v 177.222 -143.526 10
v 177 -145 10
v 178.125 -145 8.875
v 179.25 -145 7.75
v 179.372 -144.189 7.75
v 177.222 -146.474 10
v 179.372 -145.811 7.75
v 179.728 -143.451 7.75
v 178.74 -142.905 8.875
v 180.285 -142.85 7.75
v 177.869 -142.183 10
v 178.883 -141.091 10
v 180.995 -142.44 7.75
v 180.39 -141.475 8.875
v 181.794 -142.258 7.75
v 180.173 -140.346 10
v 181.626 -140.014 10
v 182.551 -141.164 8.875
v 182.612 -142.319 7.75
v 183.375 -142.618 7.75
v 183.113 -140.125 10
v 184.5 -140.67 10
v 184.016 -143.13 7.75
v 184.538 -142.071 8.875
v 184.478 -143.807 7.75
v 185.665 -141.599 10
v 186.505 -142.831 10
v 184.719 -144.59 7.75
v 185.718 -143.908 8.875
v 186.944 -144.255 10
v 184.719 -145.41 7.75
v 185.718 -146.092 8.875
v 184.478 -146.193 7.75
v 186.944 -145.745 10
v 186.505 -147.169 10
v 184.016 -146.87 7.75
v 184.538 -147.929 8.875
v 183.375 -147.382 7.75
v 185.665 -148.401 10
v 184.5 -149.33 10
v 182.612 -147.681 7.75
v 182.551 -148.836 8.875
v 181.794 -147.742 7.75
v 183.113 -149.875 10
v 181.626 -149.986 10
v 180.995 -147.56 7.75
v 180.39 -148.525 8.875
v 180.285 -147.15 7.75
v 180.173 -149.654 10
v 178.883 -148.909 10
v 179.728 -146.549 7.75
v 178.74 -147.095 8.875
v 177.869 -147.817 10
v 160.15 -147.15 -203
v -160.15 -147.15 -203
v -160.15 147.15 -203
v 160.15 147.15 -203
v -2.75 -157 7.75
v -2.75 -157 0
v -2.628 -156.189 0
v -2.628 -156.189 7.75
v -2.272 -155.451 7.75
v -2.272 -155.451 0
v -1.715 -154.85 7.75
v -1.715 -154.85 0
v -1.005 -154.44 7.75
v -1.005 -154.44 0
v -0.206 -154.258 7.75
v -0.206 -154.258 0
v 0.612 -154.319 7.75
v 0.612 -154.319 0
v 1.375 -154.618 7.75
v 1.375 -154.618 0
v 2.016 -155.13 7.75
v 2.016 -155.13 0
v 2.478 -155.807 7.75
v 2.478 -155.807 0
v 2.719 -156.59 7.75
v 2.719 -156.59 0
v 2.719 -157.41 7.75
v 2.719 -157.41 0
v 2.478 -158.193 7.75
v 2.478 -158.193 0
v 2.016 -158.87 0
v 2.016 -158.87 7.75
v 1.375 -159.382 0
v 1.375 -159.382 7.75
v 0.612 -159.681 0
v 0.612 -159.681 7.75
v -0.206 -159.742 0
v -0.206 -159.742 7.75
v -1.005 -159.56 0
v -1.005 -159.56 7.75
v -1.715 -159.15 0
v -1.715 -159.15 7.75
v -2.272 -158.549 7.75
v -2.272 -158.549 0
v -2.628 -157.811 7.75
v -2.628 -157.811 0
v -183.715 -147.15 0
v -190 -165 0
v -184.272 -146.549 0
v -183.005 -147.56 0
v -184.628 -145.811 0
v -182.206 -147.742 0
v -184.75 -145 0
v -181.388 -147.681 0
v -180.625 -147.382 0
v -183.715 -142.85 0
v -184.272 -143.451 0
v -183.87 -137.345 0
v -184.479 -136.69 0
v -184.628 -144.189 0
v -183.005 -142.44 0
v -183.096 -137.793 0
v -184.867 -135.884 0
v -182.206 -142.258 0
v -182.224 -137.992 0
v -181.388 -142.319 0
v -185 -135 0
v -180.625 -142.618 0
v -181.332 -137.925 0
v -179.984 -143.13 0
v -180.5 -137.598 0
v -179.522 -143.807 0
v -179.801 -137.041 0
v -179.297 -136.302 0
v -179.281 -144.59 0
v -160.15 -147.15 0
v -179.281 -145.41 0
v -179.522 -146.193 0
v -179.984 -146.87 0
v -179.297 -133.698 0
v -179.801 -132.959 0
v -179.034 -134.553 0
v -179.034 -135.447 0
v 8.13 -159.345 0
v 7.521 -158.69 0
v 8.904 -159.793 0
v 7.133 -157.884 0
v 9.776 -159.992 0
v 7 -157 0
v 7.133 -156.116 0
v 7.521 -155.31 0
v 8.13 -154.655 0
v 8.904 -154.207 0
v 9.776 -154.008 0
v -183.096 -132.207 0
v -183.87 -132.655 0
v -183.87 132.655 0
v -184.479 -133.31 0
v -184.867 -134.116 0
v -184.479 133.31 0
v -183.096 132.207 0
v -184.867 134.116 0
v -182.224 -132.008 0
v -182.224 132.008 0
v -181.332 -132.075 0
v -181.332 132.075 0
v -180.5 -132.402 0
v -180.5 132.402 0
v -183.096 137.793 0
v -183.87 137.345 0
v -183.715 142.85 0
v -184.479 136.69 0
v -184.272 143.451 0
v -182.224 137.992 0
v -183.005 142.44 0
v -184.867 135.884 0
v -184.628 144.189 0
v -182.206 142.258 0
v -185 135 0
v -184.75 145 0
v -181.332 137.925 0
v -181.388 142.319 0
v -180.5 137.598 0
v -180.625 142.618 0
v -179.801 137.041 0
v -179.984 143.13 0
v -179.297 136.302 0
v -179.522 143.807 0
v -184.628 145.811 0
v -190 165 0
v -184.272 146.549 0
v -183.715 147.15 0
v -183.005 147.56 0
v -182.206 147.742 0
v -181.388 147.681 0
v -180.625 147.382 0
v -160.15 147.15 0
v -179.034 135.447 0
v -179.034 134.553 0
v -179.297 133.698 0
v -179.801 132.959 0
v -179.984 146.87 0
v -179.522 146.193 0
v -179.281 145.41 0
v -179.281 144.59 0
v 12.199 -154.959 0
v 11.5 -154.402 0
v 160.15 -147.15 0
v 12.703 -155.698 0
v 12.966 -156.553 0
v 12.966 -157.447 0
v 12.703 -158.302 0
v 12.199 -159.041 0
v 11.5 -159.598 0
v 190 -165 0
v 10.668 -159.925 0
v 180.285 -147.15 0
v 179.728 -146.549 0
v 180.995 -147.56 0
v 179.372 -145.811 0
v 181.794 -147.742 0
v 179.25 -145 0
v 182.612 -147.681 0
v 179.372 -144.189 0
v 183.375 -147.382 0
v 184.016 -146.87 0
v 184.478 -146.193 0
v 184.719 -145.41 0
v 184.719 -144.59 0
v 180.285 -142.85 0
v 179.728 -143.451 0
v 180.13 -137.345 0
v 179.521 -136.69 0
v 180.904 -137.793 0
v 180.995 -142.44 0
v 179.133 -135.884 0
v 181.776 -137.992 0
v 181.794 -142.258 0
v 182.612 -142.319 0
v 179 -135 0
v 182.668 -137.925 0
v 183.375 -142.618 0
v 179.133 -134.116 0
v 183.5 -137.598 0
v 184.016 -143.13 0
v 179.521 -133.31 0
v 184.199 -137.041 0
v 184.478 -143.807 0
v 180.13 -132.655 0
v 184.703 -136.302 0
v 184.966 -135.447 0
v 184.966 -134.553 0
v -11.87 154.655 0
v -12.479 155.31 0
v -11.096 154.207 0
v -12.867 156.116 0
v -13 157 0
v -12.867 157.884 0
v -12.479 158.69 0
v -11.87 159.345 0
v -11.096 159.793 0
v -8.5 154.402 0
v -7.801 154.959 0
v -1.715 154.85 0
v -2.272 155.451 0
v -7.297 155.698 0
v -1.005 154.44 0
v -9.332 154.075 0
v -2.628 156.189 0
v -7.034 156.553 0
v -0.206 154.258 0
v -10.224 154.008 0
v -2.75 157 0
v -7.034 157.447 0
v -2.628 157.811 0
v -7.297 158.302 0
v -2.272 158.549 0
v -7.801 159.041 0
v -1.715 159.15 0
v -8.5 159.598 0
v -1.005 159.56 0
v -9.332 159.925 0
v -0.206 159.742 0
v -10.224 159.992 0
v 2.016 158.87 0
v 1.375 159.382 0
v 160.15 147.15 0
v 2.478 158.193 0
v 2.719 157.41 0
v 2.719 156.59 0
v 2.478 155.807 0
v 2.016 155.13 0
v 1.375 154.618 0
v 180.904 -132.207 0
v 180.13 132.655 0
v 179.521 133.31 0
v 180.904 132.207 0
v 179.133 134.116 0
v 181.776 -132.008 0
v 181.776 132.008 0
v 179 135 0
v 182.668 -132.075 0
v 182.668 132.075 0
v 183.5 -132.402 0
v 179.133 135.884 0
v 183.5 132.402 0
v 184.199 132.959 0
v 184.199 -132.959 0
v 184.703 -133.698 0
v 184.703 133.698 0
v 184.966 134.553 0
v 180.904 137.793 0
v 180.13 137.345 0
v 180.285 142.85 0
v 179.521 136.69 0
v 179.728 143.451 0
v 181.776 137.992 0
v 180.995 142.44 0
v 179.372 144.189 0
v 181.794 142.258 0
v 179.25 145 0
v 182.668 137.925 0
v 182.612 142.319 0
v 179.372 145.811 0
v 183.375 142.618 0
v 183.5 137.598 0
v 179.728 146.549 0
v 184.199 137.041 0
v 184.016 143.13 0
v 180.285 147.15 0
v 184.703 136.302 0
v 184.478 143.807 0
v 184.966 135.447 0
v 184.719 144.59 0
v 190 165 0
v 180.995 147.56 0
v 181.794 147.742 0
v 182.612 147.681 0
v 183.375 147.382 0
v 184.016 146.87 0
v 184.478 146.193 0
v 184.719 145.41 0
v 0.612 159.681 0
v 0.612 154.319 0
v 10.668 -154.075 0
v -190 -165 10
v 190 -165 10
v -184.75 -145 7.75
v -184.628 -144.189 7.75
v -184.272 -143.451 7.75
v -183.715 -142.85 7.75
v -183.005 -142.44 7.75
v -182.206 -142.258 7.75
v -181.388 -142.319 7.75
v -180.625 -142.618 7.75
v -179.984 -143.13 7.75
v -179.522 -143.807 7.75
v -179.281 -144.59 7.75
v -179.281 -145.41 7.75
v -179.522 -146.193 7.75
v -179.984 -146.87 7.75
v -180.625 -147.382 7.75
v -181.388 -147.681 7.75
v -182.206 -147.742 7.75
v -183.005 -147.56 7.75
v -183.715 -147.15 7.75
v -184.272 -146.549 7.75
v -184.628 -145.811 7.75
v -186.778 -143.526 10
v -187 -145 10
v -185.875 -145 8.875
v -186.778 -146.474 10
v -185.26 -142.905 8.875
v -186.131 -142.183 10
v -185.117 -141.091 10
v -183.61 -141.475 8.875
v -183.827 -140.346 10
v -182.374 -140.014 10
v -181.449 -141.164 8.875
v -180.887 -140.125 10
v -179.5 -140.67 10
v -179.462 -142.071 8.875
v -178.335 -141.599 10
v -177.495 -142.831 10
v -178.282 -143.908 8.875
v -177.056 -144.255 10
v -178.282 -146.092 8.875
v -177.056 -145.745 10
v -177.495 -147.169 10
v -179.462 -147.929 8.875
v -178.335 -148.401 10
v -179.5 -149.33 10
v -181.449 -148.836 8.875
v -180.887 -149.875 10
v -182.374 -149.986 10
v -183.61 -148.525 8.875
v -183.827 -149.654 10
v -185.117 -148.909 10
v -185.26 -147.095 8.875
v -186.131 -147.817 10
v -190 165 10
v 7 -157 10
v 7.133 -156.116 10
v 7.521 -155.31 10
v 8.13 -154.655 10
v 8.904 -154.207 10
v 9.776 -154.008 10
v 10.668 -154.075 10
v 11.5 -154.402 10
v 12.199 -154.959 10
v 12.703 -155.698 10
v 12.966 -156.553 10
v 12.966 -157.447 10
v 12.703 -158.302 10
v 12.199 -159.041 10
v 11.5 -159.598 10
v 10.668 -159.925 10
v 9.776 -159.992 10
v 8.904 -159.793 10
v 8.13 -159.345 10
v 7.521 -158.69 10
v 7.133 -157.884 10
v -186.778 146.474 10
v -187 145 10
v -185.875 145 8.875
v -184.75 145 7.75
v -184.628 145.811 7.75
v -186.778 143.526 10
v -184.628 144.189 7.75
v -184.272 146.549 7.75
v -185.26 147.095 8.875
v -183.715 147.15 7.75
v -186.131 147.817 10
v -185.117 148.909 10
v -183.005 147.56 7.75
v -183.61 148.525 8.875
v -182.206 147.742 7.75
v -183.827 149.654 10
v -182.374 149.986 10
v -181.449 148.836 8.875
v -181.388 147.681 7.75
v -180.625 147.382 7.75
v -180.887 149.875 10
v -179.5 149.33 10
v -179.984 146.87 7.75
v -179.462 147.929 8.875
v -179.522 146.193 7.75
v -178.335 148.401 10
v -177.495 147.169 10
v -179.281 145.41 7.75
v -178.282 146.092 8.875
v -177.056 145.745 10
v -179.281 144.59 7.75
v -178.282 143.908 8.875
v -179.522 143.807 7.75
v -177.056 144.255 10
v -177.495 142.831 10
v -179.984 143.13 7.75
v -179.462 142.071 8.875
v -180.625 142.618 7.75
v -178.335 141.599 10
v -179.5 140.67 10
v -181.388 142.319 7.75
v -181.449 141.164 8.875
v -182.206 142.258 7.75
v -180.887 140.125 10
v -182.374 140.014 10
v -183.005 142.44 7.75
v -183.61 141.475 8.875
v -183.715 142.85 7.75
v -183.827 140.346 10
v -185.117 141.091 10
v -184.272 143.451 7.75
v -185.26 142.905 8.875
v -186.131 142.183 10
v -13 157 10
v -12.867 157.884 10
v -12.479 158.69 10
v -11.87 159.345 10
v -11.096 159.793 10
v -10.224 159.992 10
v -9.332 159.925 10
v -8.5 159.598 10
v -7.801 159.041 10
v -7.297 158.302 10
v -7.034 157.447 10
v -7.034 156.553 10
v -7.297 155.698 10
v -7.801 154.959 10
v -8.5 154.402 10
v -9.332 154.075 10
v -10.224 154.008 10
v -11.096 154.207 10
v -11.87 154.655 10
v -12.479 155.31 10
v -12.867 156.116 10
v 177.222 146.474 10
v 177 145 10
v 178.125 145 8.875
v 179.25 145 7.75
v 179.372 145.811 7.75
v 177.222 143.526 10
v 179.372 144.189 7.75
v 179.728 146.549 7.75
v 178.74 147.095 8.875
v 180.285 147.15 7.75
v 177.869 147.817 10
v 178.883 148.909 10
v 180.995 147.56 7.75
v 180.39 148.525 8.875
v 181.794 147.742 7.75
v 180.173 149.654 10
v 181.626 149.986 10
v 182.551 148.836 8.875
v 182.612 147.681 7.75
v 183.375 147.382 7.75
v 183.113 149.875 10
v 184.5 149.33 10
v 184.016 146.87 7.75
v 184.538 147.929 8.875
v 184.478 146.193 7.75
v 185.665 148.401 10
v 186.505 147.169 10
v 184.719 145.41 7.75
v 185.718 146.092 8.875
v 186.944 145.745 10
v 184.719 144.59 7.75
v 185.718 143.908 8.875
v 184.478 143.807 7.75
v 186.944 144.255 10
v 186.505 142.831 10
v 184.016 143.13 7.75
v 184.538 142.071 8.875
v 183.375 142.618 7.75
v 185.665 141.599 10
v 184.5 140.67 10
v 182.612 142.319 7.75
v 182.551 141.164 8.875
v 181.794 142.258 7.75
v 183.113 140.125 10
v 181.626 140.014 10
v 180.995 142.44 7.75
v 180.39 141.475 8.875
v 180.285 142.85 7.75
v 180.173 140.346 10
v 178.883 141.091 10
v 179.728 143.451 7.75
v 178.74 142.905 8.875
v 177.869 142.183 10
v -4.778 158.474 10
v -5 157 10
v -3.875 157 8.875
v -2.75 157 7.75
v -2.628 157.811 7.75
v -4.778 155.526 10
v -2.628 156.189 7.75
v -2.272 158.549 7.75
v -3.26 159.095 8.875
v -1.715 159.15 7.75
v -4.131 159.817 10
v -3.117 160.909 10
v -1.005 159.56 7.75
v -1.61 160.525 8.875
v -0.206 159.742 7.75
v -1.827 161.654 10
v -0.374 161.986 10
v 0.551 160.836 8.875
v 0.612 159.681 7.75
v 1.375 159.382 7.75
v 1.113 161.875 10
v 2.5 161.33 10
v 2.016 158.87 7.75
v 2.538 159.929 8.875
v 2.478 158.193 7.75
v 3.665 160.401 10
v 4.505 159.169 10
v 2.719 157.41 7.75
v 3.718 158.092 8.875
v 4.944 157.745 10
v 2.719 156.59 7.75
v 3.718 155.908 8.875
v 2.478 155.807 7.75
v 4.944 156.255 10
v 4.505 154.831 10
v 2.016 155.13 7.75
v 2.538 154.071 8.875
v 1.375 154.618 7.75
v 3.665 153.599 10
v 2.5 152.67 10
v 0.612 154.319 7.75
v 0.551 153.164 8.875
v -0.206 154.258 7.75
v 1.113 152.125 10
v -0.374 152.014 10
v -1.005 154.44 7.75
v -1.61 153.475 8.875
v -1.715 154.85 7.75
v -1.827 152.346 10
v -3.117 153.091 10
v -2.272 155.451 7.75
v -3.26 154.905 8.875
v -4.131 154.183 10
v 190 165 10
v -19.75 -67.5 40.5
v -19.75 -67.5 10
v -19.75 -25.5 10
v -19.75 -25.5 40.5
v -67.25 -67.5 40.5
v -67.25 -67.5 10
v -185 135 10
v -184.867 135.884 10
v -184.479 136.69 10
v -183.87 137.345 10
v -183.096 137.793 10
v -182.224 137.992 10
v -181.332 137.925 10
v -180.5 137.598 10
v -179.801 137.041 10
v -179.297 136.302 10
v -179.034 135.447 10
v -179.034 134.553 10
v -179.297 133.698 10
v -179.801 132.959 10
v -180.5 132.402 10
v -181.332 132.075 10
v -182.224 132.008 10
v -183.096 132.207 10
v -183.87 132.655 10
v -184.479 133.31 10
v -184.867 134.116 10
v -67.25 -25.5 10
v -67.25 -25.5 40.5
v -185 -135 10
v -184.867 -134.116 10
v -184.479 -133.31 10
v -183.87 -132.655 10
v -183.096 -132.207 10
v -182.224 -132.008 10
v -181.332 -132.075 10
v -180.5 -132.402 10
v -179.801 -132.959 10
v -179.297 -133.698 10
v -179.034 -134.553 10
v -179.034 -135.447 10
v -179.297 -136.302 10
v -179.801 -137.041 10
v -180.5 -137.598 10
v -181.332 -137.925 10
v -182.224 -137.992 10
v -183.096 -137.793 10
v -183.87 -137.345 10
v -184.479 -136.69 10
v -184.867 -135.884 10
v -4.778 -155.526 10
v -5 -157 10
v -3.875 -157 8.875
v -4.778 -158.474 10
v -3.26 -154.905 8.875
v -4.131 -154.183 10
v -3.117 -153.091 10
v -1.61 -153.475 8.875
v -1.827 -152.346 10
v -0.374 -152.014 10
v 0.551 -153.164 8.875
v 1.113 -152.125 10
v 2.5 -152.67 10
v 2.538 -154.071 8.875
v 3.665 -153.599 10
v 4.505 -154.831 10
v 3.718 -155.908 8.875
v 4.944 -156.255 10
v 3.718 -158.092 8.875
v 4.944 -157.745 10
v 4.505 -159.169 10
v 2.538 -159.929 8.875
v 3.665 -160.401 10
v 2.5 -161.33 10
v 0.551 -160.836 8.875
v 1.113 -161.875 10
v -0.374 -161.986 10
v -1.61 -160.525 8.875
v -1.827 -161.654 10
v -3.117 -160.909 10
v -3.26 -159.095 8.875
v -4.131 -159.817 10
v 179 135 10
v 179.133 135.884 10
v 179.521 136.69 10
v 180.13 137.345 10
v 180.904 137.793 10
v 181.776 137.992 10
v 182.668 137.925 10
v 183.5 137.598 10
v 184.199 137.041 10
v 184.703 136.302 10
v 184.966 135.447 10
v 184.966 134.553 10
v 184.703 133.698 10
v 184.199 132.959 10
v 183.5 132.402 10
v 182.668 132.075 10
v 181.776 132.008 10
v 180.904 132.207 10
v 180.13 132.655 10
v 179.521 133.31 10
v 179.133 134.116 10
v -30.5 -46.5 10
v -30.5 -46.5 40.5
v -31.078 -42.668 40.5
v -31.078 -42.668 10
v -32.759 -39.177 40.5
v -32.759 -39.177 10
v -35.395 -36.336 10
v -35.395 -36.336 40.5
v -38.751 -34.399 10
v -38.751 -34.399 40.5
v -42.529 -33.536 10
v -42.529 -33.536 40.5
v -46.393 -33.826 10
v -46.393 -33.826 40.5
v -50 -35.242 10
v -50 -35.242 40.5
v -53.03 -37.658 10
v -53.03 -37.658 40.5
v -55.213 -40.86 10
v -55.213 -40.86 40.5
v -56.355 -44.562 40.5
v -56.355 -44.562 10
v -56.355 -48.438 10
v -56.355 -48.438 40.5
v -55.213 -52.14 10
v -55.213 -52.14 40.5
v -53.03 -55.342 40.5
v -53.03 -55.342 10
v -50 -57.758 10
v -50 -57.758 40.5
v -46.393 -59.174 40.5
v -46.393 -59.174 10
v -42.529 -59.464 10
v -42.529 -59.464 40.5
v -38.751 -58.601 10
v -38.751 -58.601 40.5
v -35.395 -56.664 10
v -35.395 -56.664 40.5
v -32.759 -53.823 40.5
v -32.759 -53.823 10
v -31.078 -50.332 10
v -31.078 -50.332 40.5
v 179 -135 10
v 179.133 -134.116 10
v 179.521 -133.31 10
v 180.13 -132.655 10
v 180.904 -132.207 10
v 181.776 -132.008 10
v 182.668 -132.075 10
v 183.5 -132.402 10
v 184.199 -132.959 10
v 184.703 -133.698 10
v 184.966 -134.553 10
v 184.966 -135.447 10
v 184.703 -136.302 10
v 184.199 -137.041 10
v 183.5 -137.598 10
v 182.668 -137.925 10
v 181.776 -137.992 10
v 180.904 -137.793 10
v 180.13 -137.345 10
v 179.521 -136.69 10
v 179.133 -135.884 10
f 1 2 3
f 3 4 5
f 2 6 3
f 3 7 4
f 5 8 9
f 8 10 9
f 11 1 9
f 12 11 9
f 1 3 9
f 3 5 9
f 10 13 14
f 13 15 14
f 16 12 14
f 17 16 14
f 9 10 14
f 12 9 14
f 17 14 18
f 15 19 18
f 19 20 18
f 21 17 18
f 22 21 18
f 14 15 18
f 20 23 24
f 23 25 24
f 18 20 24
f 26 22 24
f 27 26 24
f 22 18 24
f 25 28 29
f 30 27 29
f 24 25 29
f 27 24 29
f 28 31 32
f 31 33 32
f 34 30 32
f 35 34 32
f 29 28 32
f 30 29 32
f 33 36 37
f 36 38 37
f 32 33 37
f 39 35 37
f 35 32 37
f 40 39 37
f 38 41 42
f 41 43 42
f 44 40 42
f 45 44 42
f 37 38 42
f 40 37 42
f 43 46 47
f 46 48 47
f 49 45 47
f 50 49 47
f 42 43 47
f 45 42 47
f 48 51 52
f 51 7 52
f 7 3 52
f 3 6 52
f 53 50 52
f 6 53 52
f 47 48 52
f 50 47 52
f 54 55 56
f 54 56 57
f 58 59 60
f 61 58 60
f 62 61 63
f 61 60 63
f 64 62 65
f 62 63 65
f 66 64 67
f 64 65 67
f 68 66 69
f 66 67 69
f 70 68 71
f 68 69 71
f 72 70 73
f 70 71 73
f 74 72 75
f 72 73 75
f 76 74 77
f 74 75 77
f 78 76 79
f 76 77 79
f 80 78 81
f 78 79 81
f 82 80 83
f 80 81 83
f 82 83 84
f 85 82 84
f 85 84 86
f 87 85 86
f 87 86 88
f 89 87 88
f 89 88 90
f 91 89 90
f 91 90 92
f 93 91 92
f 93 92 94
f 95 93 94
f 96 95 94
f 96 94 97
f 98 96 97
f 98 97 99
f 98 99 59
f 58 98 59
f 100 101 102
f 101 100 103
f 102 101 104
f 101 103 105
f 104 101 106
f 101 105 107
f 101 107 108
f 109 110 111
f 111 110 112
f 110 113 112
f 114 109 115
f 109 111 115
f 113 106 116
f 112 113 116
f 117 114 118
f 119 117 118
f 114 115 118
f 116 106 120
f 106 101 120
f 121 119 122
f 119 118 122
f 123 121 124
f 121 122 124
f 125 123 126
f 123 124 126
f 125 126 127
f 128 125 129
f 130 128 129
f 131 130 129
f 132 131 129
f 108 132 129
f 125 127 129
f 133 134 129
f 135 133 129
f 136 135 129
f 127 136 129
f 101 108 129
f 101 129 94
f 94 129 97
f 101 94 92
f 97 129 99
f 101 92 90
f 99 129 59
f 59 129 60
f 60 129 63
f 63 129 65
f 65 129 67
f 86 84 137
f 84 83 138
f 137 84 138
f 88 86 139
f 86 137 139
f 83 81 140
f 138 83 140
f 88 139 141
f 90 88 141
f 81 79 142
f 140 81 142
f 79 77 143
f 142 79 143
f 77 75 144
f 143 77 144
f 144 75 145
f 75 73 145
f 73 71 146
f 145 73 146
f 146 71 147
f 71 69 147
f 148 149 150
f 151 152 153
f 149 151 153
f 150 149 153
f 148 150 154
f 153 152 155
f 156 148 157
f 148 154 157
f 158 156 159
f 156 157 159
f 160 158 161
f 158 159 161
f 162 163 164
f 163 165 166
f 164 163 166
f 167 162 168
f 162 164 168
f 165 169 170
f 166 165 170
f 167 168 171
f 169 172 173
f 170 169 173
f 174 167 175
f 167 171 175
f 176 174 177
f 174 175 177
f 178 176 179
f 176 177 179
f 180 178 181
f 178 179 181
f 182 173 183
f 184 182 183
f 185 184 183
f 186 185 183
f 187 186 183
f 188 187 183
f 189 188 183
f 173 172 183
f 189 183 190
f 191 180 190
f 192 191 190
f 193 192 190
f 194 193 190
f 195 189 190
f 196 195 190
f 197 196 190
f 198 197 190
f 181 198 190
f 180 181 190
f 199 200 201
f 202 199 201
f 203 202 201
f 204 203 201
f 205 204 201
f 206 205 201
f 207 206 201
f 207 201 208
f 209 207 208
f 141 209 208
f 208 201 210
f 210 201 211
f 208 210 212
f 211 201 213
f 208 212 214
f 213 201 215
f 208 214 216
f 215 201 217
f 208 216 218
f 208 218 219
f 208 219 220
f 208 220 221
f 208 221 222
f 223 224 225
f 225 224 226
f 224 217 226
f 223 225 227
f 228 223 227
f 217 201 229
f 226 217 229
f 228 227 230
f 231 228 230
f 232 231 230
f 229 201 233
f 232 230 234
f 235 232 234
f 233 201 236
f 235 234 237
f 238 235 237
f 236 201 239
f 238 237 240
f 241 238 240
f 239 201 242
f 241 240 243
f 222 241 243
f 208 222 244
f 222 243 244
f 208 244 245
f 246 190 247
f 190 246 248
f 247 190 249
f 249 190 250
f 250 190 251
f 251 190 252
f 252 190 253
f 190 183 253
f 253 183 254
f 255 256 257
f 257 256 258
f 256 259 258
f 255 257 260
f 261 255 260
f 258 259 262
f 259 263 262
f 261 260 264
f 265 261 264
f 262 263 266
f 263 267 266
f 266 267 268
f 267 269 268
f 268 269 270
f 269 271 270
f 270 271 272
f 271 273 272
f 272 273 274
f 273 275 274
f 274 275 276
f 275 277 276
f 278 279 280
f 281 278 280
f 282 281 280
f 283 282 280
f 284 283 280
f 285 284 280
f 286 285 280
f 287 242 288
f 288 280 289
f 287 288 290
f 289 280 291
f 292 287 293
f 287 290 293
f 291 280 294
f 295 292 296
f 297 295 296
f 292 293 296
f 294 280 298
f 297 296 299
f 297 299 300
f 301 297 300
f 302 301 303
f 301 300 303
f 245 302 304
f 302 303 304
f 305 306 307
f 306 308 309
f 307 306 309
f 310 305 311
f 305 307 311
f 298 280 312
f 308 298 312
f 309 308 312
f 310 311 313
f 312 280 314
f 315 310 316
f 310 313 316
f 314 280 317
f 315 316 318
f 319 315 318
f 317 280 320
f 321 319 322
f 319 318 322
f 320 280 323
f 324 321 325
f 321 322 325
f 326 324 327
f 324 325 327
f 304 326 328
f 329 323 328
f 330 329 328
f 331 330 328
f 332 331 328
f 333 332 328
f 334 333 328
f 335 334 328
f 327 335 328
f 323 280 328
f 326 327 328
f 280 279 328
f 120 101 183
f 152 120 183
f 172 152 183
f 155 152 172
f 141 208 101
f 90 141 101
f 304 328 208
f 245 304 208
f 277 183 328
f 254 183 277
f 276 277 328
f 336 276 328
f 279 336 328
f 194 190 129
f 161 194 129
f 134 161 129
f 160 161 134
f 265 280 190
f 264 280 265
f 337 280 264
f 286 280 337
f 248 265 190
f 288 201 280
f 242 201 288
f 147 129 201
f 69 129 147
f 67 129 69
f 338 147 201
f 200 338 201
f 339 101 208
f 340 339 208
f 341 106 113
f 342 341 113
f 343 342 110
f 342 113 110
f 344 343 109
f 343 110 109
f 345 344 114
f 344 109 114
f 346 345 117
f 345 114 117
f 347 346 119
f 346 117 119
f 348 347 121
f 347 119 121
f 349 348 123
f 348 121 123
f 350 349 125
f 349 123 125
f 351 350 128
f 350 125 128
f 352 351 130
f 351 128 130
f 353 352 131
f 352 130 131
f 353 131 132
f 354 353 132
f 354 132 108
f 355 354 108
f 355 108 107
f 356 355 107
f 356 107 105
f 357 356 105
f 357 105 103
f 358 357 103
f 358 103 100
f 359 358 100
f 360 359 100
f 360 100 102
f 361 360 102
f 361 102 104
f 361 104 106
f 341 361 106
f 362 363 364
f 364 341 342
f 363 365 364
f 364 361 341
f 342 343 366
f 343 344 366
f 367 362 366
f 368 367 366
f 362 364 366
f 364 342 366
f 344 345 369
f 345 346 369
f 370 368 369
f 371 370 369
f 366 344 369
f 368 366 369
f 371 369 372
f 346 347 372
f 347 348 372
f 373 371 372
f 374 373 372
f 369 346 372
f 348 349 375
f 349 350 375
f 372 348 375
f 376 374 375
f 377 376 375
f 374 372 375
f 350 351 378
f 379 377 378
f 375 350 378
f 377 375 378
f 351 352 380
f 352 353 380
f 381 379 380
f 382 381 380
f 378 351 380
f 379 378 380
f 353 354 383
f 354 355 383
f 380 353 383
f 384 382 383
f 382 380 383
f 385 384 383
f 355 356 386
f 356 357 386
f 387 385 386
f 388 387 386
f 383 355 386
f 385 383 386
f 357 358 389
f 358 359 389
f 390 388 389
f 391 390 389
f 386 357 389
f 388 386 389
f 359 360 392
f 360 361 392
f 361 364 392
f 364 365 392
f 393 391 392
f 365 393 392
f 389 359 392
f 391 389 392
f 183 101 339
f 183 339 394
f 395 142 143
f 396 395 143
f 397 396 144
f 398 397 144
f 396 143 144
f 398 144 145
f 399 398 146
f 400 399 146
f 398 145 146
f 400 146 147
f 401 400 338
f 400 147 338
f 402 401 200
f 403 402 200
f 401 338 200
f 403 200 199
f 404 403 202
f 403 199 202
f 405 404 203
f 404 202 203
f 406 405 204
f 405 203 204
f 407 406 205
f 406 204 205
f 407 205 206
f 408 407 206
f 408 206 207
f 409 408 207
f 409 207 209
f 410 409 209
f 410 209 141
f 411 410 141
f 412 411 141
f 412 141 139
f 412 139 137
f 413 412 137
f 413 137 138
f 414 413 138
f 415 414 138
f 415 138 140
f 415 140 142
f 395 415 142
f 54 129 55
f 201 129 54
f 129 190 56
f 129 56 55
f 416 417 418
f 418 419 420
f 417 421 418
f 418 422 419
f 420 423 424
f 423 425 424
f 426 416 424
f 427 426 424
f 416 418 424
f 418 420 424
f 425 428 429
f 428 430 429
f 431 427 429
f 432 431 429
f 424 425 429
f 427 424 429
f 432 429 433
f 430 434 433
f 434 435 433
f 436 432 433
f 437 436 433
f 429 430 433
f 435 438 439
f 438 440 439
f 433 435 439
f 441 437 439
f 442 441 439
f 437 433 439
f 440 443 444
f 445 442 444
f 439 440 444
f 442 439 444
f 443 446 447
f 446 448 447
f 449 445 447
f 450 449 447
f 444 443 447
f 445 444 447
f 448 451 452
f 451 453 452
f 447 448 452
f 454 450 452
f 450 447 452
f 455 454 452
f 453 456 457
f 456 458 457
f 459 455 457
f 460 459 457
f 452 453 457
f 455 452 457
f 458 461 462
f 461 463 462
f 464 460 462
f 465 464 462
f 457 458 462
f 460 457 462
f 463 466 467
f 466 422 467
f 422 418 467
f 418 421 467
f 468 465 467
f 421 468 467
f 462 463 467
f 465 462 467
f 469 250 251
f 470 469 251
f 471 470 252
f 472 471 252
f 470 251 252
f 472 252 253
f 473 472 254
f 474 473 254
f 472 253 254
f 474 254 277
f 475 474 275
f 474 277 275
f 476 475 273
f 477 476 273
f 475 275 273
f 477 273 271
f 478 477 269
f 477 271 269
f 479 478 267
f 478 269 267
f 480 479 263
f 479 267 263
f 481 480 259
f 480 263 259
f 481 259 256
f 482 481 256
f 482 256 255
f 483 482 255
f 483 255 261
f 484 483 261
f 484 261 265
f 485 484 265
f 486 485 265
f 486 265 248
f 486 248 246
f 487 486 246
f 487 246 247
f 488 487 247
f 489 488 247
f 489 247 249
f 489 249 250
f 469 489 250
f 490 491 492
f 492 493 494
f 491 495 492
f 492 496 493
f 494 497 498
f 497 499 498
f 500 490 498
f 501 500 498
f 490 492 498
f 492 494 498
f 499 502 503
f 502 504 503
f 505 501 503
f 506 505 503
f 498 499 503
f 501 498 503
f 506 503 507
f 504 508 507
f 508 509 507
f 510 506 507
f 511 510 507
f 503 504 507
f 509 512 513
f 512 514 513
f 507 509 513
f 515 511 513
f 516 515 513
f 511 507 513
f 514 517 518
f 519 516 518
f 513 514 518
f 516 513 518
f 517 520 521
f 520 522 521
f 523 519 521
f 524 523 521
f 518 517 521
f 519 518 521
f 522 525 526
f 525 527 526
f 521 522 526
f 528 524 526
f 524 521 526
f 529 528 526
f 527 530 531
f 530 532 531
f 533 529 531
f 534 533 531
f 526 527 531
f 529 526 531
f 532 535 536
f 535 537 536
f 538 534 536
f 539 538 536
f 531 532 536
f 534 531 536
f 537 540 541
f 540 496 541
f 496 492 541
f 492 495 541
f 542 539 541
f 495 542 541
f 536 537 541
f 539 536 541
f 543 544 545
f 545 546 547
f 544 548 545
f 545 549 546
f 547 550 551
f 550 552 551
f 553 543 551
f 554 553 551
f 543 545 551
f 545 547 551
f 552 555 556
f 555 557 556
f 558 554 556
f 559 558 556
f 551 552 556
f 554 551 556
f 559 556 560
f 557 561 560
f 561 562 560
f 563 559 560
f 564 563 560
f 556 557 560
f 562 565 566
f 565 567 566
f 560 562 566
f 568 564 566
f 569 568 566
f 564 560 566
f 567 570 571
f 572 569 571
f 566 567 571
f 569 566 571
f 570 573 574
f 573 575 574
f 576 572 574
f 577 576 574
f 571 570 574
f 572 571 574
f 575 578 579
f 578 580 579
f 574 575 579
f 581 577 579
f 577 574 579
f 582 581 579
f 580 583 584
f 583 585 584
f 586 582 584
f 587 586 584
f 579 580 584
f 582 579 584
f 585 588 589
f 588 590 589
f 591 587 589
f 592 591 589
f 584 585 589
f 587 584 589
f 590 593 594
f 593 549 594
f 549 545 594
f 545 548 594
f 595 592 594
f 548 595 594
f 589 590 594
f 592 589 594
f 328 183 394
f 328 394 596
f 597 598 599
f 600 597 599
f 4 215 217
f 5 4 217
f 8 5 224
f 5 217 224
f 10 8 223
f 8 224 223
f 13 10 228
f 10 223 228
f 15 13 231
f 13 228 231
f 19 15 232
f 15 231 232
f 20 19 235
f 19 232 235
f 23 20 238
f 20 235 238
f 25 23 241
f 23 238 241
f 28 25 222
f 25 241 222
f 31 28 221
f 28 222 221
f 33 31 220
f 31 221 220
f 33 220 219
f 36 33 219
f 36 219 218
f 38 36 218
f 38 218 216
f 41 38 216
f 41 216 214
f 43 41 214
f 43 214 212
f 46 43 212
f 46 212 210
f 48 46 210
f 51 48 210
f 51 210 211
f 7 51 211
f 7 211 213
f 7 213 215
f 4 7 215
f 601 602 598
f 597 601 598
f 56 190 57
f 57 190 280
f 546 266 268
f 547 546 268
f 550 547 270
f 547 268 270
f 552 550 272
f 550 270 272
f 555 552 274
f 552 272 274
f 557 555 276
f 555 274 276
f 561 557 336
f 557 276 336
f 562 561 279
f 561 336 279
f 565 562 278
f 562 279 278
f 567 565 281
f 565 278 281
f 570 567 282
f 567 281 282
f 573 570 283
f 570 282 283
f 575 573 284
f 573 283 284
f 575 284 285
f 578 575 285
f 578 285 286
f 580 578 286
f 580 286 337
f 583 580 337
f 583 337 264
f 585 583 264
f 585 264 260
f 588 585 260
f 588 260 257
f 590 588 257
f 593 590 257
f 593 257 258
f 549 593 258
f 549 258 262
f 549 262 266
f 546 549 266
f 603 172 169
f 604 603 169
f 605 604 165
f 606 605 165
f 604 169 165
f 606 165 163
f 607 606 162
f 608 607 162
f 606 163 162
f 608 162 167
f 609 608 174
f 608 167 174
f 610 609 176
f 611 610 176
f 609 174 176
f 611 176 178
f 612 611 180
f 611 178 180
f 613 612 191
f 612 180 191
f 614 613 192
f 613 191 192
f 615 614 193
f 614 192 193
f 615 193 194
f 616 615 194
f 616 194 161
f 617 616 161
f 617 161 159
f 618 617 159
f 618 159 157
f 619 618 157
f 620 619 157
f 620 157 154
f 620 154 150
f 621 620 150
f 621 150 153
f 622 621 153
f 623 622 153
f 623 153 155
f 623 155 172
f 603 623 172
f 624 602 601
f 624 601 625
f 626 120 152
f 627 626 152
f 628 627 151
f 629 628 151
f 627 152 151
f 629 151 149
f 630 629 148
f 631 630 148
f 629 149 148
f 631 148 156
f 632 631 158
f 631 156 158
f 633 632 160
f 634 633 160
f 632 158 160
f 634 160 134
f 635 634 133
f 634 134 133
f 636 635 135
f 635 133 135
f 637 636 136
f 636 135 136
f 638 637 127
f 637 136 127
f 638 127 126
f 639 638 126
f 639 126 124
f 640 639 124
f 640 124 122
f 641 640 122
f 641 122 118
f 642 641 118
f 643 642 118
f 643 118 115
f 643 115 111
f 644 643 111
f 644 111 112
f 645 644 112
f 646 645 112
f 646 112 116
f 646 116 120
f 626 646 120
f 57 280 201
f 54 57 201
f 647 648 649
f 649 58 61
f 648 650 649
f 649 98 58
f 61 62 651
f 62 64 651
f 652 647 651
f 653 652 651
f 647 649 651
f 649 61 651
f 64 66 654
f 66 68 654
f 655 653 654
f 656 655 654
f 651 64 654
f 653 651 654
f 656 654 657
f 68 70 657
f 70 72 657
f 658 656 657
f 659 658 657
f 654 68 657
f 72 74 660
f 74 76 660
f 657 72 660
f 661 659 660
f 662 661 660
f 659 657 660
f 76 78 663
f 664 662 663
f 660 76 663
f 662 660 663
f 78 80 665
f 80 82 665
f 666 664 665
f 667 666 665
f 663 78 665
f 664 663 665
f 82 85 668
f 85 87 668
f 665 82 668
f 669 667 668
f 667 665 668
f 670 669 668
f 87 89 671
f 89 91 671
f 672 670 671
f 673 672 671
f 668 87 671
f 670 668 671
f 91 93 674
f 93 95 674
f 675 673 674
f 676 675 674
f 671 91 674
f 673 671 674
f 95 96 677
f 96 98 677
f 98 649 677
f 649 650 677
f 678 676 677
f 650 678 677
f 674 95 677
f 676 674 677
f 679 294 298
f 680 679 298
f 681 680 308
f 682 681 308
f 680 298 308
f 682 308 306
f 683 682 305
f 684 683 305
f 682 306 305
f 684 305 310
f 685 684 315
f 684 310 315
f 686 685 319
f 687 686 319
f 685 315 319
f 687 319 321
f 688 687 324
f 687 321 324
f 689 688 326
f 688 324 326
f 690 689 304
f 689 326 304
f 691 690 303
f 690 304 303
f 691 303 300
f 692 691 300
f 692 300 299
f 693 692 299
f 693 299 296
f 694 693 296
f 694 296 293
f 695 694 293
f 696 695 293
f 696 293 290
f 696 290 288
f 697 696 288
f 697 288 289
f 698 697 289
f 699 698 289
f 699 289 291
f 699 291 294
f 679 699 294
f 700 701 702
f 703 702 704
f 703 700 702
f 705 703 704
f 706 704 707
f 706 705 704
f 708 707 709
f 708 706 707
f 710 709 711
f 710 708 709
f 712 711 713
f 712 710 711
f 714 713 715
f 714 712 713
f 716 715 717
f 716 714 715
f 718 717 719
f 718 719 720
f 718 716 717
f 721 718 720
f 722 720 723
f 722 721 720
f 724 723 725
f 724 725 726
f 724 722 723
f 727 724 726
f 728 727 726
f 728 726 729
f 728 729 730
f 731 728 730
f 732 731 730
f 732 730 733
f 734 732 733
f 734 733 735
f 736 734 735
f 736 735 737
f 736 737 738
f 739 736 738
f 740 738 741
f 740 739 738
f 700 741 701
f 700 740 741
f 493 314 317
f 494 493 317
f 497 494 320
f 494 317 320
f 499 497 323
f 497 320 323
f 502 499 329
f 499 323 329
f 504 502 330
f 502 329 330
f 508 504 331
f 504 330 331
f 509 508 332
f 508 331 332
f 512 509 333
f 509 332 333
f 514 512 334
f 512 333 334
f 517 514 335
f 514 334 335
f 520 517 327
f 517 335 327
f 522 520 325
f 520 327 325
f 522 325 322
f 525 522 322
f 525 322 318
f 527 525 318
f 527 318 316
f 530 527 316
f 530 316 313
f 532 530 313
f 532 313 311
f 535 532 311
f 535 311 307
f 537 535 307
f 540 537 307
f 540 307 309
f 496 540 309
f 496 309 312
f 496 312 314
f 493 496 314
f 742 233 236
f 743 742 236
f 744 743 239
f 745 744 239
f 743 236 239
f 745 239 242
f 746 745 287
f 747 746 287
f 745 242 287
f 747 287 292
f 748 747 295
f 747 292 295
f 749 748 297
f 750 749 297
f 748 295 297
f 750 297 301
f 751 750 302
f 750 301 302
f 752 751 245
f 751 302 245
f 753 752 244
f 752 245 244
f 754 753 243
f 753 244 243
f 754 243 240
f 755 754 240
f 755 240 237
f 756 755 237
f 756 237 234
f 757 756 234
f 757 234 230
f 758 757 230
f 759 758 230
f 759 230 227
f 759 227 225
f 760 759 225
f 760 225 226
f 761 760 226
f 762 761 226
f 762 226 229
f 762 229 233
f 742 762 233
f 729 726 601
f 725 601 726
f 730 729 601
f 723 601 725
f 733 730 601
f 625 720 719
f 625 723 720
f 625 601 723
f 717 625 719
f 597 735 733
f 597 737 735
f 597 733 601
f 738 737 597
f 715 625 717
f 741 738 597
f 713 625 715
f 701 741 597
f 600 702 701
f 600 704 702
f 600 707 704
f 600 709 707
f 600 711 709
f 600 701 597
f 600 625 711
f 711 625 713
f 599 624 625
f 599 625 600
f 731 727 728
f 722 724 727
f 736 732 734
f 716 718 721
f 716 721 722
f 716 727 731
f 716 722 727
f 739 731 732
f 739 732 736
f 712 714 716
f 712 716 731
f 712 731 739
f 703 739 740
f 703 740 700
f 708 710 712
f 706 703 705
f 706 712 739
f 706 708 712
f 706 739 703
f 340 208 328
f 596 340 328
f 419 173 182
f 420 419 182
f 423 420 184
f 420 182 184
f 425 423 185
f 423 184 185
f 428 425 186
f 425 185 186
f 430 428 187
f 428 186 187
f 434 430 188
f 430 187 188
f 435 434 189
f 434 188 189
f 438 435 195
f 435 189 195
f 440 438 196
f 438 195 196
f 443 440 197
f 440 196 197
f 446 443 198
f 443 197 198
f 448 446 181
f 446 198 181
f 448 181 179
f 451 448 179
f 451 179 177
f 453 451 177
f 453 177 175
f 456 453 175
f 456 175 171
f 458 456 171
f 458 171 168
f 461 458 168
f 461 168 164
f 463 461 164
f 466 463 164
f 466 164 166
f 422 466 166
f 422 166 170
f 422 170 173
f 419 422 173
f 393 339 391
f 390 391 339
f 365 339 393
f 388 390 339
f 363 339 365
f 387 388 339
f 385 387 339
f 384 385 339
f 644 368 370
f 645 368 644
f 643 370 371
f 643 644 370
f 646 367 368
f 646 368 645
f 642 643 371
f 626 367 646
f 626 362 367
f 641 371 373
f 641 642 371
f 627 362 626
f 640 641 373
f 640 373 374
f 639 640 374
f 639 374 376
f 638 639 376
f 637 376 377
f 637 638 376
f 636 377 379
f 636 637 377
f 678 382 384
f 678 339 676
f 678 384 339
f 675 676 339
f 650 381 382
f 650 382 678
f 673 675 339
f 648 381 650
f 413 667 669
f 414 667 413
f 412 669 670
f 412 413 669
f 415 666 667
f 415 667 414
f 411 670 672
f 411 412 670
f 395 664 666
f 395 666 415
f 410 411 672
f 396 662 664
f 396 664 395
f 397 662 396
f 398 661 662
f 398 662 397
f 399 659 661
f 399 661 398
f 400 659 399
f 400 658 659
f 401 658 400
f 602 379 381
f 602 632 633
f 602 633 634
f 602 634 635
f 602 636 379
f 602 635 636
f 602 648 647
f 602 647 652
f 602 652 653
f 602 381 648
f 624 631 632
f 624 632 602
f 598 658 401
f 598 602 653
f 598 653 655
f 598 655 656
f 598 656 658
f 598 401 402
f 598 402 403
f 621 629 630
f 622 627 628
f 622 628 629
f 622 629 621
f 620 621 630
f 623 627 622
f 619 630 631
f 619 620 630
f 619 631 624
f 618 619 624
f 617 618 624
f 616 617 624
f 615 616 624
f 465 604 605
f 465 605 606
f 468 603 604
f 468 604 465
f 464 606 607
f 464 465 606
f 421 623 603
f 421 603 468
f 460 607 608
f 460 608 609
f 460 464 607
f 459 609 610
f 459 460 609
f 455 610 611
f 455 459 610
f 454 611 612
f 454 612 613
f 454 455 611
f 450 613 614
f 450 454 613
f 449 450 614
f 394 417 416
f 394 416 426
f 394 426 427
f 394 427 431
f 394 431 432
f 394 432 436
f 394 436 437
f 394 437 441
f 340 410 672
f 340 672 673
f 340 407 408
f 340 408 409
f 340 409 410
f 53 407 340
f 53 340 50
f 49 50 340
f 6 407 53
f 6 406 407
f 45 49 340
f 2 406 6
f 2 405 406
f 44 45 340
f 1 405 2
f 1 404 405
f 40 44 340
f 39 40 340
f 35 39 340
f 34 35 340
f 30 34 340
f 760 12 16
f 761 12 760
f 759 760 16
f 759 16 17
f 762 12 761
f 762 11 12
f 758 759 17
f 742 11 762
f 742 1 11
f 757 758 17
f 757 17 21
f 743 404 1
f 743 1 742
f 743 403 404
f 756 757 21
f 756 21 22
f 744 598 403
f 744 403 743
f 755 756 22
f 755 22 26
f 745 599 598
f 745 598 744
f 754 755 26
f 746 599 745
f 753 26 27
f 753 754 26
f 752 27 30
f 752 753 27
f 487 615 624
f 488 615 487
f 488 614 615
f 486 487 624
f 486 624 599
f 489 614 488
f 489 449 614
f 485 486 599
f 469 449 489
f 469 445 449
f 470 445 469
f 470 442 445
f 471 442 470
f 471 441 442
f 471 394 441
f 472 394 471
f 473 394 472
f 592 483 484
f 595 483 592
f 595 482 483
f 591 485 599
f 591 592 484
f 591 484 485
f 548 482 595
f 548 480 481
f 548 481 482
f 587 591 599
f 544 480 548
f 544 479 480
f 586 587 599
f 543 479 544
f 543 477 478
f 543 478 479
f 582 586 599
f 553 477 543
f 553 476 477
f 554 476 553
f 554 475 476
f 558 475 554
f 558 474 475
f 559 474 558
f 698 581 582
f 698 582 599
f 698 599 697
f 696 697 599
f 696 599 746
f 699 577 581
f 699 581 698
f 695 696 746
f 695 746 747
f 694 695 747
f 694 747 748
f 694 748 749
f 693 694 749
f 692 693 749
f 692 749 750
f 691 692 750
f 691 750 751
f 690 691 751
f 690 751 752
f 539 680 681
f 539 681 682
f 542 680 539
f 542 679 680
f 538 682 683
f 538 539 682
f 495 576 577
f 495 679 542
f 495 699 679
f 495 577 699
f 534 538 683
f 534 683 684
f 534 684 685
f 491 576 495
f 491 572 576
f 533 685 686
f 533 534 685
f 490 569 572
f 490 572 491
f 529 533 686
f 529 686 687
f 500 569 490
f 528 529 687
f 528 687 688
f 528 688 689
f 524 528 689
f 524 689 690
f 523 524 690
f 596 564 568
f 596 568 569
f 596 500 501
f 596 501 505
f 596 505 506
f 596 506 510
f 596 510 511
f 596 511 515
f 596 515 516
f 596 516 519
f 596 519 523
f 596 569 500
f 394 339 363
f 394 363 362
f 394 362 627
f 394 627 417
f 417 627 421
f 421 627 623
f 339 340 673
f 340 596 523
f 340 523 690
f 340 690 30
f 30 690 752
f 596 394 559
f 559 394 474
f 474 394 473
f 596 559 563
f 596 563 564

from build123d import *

# Parameters (mm, degrees)
F0_W           = 380
F0_H           = 330
F1_DEPTH       = 10
F2_W           = 320.3
F2_H           = 294.3
F3_DEPTH       = 203
F4_W           = 47.5
F4_H           = 42
F4_R           = 13
F5_DEPTH       = 30.5
F7_D           = 6
F7_DEPTH       = 10
F8_D           = 5.5
F8_DEPTH       = 10
F8_CSINK_D     = 10
F8_CSINK_ANGLE = 90


with BuildPart() as f1:
    # F0 (on Top) → F1 (new body)
    with BuildSketch(Plane.XY):
        Rectangle(F0_W, F0_H)
    extrude(amount=F1_DEPTH)

    # F2 (on face) → F3 (join)
    with BuildSketch(Plane(origin=(0, 0, 0), x_dir=(1, 0, 0), z_dir=(0, 0, -1))):
        Rectangle(F2_W, F2_H)
    extrude(amount=F3_DEPTH)

    # F4 (on face) → F5 (join)
    with BuildSketch(Plane.XY.offset(10)):
        with Locations((-43.5, -46.5)):
            Rectangle(F4_W, F4_H)
        with Locations((-43.5, -46.5)):
            Circle(F4_R, mode=Mode.SUBTRACT)
    extrude(amount=F5_DEPTH)

    # F7
    with Locations(Plane.XY.offset(10)):
        with Locations((-182, 135), (-182, -135), (182, 135), (182, -135), (10, -157), (-10, 157)):
            Hole(F7_D / 2, depth=F7_DEPTH)

    # F8
    with Locations(Plane.XY.offset(10)):
        with Locations((-182, 145), (182, 145), (-182, -145), (182, -145), (0, -157), (0, 157)):
            CounterSinkHole(F8_D / 2, F8_CSINK_D / 2, depth=F8_DEPTH, counter_sink_angle=F8_CSINK_ANGLE)


solid = f1.part
